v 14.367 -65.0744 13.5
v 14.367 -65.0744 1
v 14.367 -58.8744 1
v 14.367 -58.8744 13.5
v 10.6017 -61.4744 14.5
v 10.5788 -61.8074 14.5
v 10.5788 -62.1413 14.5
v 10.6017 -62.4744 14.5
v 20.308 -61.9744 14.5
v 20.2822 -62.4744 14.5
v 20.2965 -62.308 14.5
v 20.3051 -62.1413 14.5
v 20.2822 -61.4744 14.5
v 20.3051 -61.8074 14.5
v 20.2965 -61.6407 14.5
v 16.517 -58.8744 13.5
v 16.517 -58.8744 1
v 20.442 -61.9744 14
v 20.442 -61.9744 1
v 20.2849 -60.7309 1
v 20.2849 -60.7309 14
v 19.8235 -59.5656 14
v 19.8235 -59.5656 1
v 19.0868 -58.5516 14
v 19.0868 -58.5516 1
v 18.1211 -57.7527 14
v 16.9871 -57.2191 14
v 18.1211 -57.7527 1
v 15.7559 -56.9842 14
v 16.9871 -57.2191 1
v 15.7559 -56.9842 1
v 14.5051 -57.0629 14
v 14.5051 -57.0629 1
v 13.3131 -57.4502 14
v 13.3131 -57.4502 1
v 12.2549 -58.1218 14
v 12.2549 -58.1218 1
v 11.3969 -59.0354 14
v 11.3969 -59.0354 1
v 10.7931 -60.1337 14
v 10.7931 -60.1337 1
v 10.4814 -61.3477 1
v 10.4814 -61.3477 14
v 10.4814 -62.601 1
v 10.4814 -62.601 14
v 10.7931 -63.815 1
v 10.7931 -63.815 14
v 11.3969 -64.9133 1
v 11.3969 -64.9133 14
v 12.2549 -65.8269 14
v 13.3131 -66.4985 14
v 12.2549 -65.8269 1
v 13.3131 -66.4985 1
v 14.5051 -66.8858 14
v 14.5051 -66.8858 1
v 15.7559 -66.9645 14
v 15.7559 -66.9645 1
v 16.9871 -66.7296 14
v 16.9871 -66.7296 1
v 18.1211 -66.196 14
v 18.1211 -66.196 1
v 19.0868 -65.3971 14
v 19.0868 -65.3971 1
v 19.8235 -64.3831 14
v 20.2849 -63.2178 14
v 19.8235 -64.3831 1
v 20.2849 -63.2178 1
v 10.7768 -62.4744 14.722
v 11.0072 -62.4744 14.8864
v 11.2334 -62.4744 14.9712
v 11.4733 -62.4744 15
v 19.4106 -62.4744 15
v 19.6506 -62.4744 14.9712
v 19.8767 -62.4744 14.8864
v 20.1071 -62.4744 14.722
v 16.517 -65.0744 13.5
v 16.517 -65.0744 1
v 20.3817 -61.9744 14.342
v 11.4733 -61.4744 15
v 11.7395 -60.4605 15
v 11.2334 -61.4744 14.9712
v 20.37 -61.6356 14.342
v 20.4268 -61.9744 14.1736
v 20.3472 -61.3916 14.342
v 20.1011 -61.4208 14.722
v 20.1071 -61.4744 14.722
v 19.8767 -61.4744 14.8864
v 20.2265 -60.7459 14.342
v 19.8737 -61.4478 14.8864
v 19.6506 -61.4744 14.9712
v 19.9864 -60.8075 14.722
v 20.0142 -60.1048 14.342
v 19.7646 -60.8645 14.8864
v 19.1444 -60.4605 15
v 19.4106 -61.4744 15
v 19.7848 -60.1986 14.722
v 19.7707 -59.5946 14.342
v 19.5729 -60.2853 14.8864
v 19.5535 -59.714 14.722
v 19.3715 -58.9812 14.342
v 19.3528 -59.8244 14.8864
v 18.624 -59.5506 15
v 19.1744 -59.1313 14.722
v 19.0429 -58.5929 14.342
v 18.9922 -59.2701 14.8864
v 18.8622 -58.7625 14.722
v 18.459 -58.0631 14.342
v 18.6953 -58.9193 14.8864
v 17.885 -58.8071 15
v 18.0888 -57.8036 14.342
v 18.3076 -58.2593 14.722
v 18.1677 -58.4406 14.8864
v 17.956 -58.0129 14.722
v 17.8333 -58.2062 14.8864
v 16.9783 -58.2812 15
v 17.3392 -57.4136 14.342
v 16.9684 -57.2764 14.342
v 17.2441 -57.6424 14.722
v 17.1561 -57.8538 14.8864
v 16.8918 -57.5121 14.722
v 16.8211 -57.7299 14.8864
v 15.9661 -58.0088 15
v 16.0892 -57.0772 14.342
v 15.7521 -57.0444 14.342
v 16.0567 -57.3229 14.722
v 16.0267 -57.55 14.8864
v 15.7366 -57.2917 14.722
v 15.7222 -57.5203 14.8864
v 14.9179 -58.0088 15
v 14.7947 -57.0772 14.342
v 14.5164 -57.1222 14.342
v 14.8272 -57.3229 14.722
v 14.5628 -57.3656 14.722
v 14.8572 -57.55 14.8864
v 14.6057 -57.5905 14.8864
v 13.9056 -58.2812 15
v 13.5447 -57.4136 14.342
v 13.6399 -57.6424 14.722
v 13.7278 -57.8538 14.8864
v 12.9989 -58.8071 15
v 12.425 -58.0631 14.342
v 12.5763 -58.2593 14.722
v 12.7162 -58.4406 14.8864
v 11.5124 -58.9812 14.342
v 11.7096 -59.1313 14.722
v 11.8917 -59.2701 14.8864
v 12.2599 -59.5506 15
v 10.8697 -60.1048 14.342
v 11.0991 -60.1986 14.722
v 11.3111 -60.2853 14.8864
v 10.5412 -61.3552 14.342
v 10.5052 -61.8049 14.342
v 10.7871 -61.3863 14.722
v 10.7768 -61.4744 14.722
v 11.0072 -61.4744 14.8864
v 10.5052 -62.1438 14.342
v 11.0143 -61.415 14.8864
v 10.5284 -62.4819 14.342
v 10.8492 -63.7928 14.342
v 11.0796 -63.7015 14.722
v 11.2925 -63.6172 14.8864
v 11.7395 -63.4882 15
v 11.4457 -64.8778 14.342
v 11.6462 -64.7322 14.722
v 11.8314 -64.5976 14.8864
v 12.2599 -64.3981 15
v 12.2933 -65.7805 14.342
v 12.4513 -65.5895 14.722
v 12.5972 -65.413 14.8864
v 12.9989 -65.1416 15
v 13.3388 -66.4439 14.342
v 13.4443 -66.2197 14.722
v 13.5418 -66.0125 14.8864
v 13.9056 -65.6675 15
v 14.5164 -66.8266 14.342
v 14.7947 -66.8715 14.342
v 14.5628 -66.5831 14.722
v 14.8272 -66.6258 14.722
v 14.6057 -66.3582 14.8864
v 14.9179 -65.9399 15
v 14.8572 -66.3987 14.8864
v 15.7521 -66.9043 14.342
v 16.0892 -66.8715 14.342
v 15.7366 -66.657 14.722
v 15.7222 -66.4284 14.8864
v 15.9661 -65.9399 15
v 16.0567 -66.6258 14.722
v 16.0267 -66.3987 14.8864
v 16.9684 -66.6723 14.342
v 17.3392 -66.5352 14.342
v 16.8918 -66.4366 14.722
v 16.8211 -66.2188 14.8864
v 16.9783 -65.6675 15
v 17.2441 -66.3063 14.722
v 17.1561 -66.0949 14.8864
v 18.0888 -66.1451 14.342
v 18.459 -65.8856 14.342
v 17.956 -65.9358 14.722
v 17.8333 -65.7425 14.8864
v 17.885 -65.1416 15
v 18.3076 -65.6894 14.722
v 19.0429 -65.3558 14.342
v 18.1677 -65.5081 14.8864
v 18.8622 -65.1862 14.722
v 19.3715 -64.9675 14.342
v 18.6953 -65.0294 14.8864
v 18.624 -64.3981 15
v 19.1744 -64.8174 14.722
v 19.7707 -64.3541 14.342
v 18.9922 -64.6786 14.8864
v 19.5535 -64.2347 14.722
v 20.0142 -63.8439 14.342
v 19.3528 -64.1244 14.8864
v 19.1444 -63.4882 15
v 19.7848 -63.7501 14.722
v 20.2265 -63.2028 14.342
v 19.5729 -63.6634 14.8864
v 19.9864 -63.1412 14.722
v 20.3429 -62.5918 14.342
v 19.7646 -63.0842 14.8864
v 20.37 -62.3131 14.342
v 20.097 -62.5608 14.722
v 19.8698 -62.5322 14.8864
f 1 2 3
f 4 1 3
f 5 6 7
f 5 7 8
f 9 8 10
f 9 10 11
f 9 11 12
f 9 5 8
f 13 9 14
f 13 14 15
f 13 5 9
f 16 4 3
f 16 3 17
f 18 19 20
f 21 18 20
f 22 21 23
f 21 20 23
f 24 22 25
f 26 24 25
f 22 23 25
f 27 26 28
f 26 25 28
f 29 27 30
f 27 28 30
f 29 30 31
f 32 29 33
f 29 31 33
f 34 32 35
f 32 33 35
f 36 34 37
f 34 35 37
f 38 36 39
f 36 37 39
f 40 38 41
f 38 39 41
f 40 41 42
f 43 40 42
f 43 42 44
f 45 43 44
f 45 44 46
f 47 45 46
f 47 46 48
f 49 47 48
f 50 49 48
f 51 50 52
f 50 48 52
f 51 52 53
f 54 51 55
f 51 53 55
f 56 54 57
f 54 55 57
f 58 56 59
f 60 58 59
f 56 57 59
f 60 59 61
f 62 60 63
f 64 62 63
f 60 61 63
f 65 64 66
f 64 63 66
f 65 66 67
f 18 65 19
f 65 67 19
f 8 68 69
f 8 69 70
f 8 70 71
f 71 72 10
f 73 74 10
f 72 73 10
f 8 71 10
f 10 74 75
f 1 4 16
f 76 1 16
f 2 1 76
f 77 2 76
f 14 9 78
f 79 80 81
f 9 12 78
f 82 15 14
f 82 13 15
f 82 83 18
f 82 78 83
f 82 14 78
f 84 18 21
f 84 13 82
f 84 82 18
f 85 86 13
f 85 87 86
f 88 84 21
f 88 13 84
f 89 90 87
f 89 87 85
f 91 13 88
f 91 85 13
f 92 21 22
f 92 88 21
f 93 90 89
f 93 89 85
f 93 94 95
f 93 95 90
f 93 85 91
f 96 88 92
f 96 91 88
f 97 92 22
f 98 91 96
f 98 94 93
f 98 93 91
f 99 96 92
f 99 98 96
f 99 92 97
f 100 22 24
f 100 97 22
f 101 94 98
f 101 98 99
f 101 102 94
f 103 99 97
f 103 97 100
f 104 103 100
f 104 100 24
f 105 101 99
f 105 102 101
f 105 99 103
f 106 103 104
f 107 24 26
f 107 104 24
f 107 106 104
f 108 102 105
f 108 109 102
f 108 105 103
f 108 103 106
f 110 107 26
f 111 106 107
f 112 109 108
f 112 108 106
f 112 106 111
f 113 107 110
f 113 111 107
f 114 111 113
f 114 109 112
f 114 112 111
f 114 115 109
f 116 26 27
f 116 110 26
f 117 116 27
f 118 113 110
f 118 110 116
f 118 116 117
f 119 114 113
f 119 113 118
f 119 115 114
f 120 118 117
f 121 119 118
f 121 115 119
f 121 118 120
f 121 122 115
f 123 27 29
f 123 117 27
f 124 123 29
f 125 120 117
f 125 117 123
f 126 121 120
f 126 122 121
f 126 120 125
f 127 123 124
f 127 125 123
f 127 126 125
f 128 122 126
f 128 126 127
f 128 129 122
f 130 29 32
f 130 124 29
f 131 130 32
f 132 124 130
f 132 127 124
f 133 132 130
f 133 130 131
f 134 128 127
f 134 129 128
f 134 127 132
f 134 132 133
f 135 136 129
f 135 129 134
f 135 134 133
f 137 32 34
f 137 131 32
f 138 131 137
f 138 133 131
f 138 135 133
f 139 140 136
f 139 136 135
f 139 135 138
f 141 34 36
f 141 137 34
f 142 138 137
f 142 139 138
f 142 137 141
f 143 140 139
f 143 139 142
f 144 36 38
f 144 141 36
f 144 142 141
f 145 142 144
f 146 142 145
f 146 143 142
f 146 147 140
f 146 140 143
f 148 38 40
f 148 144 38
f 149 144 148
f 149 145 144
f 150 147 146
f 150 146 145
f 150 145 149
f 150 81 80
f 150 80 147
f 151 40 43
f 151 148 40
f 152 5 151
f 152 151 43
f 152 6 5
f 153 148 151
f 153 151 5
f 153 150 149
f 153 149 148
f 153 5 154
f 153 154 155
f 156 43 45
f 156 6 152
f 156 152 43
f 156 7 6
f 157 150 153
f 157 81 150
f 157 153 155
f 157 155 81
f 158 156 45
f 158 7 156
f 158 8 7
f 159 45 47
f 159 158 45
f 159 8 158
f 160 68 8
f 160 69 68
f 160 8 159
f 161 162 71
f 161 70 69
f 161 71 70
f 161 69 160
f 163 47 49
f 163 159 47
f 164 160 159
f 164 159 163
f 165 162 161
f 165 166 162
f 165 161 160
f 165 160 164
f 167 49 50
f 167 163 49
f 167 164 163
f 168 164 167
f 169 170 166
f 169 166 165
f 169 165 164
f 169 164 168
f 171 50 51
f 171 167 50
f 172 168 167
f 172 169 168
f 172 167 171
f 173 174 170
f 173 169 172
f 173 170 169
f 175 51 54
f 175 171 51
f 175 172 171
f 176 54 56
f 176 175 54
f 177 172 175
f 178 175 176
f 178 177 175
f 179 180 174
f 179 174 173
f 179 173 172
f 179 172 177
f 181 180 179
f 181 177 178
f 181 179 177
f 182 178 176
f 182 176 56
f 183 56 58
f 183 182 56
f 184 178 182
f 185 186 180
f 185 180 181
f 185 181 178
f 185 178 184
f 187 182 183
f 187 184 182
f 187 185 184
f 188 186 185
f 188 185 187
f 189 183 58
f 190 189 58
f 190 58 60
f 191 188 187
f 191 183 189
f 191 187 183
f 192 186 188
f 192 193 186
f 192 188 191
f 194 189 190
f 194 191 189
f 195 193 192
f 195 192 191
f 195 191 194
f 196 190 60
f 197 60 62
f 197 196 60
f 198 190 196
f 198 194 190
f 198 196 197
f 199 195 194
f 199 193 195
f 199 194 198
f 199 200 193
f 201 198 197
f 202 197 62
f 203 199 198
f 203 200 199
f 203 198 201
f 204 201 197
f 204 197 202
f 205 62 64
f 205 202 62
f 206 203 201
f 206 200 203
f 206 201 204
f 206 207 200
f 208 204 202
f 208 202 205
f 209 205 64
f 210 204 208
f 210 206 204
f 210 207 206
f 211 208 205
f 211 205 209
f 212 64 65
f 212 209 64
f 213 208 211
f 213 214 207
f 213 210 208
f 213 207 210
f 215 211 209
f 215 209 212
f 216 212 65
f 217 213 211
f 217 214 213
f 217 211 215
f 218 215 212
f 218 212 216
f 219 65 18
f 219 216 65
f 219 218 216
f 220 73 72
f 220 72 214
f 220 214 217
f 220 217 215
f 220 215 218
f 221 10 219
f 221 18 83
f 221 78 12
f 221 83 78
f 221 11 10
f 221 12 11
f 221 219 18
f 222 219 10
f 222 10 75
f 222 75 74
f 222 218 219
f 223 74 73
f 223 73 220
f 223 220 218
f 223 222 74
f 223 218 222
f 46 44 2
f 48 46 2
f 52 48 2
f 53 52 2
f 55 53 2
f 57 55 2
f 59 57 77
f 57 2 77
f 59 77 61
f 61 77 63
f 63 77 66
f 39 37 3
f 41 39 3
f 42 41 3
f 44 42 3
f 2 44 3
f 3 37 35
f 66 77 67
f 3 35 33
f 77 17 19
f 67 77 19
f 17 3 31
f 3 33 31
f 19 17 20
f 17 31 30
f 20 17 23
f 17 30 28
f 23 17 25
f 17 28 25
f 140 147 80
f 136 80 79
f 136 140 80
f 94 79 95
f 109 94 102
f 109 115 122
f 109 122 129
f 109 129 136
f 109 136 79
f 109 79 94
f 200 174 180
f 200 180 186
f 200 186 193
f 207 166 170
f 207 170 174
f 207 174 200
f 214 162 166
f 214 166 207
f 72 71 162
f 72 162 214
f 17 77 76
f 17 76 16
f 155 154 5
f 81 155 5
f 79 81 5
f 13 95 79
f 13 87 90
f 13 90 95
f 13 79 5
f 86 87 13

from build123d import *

# Parameters (mm, degrees)
BOSS_EXTRUDE1_START = 1
SKETCH1_R           = 5
BOSS_EXTRUDE1_DEPTH = 14
CUT_EXTRUDE1_START  = -1.5
SKETCH2_W           = 2.15
SKETCH2_H           = 6.2
CUT_EXTRUDE1_DEPTH  = 15
FILLET2_R           = 1
SKETCH3_W           = 10
SKETCH3_H           = 1
CUT_EXTRUDE2_DEPTH  = 0.5


with BuildPart() as part:
    # Sketch1 → Boss-Extrude1 (new body)
    with BuildSketch(Plane.XY.offset(BOSS_EXTRUDE1_START)):
        with Locations((15.441970815, -61.974353767)):
            Circle(SKETCH1_R)
    extrude(amount=BOSS_EXTRUDE1_DEPTH)

    # Sketch2 → Cut-Extrude1 (cut)
    with BuildSketch(Plane.XY.offset(15).offset(CUT_EXTRUDE1_START)):
        with Locations((15.441970815, -61.974353767)):
            Rectangle(SKETCH2_W, SKETCH2_H)
    extrude(amount=-CUT_EXTRUDE1_DEPTH, mode=Mode.SUBTRACT)

    # Fillet2
    fillet2_edges = [part.edges().sort_by_distance(p)[0] for p in [
        (10.441970815, -61.974353767, 15),
    ]]
    fillet(fillet2_edges, radius=FILLET2_R)

    # Sketch3 → Cut-Extrude2 (cut)
    with BuildSketch(Plane.XY.offset(15)):
        with Locations((15.441970815, -61.974353767)):
            Rectangle(SKETCH3_W, SKETCH3_H)
    extrude(amount=-CUT_EXTRUDE2_DEPTH, mode=Mode.SUBTRACT)


solid = part.part
